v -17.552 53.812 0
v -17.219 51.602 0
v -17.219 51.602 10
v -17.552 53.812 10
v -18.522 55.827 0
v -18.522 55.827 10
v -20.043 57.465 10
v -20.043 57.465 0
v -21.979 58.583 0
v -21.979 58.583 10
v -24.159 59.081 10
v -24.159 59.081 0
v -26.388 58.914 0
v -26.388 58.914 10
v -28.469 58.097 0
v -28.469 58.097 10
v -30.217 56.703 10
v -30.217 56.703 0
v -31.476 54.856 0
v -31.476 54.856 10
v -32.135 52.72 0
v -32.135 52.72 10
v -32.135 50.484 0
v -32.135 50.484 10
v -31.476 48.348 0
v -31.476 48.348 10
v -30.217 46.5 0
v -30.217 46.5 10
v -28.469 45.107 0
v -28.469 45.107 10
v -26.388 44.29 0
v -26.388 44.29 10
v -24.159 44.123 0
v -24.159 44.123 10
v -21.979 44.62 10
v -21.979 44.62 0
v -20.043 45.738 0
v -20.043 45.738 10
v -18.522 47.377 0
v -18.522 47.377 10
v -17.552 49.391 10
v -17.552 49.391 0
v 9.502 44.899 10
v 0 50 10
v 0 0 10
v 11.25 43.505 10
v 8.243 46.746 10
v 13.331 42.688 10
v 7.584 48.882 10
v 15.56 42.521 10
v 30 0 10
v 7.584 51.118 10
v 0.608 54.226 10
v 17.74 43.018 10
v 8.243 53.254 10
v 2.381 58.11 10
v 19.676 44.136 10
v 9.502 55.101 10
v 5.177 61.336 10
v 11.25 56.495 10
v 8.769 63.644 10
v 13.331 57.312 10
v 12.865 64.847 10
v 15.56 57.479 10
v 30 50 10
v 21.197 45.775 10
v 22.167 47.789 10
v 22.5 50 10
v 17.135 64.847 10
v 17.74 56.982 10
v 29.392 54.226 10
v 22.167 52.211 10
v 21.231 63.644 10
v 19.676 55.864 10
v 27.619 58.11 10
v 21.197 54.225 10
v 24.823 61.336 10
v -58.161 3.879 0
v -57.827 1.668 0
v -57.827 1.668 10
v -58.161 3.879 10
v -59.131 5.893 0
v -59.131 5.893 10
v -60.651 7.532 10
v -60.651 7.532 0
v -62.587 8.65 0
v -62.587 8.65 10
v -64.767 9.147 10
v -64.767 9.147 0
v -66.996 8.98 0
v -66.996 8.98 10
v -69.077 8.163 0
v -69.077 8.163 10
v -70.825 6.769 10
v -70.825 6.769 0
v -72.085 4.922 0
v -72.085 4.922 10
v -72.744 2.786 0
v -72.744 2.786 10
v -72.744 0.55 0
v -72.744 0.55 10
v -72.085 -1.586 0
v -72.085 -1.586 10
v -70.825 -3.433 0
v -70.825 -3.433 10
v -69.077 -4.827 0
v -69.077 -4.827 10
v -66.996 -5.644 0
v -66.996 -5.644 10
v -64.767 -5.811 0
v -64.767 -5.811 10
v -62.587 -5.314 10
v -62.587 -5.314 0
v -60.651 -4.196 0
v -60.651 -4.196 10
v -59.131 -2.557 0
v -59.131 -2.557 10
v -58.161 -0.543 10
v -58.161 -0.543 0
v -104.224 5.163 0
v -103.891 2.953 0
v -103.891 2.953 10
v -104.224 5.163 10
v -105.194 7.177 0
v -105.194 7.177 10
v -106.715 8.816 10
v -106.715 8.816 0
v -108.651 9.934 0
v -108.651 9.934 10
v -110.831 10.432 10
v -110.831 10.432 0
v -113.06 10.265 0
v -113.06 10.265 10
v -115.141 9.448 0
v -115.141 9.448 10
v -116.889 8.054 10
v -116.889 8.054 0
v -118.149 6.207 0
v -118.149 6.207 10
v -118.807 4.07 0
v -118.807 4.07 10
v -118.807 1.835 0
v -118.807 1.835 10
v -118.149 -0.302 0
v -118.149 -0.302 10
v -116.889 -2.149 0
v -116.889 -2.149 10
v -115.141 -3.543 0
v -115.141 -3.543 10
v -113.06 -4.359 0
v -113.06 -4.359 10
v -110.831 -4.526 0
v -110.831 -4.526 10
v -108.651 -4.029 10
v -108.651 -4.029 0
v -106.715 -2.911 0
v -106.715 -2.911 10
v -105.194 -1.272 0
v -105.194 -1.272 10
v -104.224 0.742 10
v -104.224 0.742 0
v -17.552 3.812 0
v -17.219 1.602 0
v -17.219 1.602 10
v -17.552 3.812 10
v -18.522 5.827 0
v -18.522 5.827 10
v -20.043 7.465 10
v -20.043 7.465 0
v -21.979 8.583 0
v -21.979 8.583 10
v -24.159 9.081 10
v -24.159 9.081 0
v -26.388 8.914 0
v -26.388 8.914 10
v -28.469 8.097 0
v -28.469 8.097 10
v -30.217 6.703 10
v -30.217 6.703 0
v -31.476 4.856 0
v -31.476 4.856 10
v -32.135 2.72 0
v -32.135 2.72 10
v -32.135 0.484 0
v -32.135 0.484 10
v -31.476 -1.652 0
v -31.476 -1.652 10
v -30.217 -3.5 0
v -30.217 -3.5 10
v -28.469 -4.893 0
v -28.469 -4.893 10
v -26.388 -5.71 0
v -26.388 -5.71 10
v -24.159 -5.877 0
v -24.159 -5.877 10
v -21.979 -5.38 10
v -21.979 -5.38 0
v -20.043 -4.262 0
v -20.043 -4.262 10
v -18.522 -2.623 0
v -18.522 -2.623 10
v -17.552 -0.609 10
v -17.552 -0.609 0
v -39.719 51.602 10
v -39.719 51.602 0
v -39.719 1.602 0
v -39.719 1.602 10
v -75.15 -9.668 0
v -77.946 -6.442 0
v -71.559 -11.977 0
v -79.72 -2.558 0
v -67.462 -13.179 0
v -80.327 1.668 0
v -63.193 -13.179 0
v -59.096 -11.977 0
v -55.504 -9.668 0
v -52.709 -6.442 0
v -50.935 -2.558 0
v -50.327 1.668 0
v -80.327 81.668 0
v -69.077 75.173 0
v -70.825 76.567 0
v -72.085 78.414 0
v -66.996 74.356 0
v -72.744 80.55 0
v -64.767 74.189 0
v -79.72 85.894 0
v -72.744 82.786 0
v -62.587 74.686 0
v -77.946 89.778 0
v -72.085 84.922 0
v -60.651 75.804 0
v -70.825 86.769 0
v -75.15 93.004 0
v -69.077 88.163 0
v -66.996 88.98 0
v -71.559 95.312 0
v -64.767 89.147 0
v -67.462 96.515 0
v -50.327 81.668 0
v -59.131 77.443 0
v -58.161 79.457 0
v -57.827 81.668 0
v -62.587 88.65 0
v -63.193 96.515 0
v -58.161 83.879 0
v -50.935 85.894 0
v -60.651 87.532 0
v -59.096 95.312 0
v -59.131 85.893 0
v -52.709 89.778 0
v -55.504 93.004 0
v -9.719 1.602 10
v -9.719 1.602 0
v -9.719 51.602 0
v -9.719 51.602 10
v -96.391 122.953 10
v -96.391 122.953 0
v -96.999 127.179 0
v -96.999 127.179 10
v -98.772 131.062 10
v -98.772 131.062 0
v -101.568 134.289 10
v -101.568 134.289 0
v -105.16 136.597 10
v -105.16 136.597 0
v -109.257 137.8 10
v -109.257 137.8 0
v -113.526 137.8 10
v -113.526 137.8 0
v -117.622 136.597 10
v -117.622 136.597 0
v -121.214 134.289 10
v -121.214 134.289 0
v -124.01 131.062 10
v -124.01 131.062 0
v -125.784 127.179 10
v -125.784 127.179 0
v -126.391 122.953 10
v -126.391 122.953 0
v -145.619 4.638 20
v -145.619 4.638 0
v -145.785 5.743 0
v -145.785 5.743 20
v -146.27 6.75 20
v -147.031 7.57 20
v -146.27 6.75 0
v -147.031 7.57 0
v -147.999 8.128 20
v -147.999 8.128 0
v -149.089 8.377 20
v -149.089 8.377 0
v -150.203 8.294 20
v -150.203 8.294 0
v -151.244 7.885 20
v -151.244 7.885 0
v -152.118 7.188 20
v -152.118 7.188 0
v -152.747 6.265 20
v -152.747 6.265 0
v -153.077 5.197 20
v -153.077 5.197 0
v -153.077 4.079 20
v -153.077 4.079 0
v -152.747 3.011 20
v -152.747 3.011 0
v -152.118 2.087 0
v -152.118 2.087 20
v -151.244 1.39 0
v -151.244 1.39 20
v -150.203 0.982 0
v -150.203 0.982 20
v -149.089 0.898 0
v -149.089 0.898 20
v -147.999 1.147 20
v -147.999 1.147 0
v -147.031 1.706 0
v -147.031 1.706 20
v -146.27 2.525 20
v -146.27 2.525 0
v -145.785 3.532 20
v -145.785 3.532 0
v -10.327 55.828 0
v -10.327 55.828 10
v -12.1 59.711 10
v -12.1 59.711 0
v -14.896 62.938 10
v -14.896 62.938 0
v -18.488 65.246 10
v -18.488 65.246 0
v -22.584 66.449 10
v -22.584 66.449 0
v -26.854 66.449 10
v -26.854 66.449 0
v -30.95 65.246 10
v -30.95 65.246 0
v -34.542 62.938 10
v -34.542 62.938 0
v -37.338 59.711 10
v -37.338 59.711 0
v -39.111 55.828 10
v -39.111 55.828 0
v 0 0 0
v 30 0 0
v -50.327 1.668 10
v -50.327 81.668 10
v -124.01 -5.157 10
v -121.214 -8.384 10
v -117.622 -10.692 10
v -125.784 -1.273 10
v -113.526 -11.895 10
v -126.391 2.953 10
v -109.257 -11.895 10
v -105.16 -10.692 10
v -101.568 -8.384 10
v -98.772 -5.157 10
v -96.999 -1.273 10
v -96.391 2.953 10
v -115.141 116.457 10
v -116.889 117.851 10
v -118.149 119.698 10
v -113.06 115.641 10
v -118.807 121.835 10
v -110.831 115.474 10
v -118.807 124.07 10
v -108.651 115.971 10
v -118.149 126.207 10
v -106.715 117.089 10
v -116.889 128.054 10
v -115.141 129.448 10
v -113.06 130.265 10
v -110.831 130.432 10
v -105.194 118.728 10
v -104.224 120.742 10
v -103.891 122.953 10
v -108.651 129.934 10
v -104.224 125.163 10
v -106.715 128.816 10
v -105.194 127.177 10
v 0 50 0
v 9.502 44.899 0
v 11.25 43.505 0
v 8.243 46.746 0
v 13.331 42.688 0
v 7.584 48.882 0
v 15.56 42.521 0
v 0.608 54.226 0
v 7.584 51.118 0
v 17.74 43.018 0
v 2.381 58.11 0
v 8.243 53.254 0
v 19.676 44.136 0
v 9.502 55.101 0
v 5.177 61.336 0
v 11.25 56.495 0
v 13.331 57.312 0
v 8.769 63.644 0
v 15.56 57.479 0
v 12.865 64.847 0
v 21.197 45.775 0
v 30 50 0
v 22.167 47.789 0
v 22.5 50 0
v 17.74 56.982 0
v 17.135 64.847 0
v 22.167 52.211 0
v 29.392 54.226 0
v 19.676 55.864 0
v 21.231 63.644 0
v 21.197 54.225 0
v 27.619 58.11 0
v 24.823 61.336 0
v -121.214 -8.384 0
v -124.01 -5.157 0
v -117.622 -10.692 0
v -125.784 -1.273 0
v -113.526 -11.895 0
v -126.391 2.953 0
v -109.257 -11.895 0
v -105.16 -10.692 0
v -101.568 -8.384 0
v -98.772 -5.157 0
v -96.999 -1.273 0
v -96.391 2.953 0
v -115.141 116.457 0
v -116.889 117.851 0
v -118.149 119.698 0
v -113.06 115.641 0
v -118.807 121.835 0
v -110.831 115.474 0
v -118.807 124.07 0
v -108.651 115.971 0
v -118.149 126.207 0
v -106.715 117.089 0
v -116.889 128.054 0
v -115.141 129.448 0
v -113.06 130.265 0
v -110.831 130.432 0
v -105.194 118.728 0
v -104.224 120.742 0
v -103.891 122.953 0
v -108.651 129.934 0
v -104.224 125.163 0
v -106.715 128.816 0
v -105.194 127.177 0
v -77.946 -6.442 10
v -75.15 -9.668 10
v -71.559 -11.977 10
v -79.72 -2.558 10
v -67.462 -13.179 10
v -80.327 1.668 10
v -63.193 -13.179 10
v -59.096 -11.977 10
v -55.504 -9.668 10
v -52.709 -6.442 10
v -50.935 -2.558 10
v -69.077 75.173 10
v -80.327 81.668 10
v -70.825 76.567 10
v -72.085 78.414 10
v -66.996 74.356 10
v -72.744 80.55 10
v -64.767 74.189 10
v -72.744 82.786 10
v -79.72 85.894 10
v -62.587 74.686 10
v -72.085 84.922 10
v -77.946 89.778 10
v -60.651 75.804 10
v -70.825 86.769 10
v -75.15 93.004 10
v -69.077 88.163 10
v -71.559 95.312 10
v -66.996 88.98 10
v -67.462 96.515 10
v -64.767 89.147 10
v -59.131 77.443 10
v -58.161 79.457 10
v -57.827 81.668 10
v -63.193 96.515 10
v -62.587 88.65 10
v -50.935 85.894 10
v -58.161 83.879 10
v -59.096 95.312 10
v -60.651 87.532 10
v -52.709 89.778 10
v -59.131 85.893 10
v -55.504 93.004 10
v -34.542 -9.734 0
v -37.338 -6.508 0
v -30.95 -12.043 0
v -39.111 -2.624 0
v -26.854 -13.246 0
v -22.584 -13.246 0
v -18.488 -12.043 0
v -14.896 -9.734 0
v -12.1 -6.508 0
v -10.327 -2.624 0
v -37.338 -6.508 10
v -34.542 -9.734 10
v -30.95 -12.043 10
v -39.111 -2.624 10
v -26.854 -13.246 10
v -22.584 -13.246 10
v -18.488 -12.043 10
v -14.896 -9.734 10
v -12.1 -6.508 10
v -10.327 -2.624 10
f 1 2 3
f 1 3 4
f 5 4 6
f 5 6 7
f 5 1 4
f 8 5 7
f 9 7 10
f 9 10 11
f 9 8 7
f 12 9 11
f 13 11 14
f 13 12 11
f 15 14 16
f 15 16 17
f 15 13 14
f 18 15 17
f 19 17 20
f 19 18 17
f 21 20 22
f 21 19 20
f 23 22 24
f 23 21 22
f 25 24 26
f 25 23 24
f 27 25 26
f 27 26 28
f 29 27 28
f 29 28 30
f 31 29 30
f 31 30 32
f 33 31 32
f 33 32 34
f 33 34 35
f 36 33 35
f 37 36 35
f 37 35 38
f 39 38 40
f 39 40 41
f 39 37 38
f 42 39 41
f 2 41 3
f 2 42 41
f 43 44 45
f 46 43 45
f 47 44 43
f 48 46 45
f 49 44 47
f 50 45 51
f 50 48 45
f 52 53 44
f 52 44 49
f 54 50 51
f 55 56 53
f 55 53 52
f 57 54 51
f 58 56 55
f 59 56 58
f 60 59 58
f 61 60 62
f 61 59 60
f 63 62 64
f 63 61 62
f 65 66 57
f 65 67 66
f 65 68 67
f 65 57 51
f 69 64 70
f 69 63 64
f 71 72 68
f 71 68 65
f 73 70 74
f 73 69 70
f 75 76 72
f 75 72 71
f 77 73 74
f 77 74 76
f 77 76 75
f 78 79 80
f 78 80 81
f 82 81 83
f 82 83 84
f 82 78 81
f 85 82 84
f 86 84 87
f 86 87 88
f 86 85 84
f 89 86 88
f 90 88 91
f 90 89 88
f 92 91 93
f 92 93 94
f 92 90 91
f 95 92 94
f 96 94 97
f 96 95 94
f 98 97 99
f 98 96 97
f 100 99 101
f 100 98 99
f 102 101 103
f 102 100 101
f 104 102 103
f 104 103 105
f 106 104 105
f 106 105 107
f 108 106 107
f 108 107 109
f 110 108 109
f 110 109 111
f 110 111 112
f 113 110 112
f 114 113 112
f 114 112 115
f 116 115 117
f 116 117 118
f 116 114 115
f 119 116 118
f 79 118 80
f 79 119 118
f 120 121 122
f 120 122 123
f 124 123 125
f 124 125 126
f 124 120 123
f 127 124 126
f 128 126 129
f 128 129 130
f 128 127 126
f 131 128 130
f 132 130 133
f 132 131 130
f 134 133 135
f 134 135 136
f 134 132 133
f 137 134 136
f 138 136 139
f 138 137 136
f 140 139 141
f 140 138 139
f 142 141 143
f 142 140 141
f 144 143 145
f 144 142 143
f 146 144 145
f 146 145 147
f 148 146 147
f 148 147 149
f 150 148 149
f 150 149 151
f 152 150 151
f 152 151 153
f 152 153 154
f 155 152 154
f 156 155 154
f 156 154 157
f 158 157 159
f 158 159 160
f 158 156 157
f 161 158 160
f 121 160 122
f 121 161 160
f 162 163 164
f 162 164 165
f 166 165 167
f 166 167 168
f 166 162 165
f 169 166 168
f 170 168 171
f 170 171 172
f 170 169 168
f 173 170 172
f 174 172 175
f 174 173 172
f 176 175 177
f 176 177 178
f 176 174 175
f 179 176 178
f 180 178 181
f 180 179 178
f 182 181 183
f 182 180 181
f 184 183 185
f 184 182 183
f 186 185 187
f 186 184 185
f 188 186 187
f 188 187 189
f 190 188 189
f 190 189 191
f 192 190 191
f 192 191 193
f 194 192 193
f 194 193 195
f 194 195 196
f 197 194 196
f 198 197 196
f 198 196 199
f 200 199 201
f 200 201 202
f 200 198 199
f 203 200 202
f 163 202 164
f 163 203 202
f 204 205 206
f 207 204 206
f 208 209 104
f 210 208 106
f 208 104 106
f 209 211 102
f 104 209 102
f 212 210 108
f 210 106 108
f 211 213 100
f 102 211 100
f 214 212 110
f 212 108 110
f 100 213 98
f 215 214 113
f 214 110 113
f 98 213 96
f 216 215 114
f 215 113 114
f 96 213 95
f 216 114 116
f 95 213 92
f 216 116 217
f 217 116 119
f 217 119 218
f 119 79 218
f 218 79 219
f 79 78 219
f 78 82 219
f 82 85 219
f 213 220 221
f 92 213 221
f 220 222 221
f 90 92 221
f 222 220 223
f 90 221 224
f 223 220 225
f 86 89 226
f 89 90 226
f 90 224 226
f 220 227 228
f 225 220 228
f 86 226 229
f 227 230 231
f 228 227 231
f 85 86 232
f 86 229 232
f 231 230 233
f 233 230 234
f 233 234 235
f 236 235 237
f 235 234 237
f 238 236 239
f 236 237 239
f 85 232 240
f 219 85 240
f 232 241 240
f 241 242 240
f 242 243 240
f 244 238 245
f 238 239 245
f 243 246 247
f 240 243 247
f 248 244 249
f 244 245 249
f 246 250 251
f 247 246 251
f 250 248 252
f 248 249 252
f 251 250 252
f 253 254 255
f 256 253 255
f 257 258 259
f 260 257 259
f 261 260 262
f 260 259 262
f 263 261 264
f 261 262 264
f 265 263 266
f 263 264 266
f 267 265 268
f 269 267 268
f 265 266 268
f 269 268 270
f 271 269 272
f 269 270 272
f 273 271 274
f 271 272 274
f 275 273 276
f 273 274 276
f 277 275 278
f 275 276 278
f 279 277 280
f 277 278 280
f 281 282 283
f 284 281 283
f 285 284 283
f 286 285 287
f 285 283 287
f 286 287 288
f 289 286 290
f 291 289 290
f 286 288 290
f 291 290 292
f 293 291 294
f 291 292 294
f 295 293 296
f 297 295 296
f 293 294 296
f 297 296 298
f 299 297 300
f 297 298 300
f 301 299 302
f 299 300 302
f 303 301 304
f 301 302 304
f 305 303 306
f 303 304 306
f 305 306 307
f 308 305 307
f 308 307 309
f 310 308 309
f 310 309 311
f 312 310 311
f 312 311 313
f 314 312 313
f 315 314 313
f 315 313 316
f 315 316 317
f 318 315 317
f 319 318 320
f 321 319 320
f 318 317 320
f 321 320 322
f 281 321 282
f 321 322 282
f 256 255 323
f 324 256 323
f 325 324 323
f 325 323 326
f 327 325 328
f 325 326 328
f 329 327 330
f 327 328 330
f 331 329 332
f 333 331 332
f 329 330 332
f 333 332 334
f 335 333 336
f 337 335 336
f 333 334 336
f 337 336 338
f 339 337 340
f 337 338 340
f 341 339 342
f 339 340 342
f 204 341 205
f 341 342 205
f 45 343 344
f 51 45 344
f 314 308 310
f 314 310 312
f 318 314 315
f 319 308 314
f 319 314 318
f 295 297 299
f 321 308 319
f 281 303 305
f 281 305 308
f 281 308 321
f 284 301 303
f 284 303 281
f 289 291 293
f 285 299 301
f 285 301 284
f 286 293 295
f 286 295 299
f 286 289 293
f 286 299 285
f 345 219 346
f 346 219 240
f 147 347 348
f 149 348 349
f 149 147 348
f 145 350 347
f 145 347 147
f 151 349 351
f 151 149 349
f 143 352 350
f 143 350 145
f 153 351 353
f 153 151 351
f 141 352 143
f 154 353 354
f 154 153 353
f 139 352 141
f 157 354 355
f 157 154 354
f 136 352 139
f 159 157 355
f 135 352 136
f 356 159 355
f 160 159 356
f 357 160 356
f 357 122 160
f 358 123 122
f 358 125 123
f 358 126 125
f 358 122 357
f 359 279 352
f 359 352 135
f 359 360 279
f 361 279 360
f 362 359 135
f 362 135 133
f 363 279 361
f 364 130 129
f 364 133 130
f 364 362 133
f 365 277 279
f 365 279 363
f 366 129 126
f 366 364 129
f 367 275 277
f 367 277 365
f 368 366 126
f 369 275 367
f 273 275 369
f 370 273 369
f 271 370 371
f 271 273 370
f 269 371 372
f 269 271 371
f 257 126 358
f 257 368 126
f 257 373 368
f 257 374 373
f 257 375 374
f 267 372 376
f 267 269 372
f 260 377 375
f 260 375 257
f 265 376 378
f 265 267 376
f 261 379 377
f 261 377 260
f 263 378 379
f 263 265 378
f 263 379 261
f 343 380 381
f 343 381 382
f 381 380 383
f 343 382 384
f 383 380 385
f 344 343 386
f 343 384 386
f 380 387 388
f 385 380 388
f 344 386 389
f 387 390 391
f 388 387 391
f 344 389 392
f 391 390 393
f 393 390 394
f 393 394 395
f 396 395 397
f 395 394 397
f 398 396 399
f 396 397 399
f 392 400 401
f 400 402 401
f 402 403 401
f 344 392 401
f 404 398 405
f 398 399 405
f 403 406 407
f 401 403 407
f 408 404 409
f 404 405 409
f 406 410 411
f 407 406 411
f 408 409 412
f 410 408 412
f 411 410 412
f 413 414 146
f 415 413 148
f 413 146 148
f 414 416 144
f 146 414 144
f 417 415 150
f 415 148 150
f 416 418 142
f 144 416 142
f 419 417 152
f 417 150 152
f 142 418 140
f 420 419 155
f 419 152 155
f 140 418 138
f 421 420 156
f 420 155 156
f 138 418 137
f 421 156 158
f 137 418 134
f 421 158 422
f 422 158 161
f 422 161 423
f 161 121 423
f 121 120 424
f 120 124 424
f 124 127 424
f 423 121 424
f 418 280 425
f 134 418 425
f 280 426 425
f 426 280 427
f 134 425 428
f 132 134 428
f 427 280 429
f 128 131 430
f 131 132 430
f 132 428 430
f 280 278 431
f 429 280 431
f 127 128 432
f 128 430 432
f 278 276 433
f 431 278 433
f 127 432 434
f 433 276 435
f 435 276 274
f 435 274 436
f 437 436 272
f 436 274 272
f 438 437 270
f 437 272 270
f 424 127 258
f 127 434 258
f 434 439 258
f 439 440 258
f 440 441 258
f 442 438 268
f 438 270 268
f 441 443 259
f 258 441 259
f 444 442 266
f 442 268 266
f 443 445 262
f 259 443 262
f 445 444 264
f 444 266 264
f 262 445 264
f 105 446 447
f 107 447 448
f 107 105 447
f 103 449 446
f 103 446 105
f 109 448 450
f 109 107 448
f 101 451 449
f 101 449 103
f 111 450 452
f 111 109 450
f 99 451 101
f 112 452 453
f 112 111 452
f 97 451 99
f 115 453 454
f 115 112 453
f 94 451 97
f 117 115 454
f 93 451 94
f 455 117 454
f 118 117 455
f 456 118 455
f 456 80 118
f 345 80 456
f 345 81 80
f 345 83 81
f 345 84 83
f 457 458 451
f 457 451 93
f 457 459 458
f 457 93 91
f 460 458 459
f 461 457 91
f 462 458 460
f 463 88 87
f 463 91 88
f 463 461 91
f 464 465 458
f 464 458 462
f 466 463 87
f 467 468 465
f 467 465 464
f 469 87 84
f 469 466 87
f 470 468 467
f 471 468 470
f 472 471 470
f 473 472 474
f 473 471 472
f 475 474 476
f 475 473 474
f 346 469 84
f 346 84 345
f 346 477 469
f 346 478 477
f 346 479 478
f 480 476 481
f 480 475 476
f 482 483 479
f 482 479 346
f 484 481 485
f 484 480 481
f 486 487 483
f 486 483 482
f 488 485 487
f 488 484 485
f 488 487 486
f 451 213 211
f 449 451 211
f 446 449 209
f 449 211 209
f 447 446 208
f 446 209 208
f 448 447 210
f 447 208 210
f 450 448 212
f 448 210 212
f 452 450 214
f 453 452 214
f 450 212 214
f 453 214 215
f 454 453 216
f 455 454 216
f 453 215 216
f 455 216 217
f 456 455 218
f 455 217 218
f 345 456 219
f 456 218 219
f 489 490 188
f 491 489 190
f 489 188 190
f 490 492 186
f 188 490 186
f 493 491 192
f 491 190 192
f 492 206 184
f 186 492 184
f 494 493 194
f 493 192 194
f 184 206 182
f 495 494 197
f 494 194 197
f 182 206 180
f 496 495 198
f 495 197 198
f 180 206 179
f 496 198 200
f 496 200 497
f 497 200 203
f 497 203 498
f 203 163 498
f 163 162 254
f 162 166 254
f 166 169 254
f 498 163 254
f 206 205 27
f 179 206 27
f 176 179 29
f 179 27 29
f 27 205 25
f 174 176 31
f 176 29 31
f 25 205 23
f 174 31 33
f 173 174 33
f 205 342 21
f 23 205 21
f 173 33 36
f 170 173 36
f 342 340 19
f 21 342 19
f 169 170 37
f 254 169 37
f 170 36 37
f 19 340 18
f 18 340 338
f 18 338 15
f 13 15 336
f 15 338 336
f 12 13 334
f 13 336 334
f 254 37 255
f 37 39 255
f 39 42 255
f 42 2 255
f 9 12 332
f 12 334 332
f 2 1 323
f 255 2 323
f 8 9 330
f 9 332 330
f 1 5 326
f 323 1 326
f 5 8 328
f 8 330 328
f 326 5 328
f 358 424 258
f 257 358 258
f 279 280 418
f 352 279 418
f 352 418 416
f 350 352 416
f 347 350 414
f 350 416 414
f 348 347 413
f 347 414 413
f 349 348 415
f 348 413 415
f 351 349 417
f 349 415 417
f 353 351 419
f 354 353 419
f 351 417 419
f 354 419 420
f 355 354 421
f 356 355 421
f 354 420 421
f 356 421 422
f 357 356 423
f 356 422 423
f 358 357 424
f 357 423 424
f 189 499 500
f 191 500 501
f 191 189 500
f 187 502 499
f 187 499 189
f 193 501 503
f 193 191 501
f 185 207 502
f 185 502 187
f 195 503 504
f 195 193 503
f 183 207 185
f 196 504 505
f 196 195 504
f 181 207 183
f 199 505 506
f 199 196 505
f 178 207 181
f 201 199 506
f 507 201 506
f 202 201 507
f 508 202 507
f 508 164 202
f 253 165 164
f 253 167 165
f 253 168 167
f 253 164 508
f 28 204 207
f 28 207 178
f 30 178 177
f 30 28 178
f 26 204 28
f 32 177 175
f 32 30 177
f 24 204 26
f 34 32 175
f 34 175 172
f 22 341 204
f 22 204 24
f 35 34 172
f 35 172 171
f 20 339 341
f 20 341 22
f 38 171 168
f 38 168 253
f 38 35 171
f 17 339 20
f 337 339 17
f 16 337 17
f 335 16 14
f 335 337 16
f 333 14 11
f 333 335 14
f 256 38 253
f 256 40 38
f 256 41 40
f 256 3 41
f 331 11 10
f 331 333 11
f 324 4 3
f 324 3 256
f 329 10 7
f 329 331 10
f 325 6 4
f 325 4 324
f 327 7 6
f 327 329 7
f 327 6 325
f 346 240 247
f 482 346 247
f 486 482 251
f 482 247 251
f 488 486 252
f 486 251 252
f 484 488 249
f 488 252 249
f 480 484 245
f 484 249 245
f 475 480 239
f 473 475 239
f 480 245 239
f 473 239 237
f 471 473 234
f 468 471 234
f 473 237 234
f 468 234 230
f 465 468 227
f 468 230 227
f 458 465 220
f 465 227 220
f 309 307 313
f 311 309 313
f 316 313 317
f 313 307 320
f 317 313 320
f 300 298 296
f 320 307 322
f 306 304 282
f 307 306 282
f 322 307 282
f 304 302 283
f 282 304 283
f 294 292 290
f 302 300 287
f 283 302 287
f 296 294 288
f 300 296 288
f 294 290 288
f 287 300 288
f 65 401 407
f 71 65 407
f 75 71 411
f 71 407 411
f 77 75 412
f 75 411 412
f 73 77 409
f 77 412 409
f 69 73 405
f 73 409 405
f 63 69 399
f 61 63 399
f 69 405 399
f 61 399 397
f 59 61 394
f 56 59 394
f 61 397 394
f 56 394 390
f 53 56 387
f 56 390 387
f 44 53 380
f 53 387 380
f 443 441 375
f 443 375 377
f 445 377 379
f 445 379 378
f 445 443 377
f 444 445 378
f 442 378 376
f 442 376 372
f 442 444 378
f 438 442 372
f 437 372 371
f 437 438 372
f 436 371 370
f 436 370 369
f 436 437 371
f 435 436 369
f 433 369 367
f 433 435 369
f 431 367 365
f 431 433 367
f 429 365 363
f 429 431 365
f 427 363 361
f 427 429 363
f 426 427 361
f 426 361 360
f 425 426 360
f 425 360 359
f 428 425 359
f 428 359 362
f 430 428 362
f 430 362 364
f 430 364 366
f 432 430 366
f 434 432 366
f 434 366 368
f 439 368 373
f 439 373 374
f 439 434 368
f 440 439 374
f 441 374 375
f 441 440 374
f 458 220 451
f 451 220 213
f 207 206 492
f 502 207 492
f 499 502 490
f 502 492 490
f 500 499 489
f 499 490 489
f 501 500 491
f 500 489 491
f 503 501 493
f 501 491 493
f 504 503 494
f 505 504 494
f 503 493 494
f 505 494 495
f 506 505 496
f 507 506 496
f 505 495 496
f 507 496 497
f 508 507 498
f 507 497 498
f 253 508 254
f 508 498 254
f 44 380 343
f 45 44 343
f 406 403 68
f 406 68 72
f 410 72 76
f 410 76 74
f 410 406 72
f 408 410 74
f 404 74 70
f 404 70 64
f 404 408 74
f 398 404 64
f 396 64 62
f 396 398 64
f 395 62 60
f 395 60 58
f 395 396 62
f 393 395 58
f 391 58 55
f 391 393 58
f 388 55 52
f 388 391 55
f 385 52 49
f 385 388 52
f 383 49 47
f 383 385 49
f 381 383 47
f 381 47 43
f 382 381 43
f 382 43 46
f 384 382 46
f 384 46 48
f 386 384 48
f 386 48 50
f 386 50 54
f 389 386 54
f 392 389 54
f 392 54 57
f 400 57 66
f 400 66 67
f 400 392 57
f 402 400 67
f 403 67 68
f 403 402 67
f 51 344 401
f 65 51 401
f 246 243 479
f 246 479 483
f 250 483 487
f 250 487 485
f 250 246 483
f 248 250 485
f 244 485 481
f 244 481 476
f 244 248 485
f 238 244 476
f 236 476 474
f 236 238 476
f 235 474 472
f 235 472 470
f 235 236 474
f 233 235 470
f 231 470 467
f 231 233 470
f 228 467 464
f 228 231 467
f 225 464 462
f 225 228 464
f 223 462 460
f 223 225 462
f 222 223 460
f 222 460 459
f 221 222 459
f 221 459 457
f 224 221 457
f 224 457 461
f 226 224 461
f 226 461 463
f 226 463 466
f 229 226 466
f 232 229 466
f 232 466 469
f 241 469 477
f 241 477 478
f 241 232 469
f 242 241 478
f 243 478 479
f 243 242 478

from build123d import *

# Parameters (mm, degrees)
F1_R      = 7.5
F2_DEPTH  = 10
F3_R      = 7.5
F4_DEPTH  = 10
F5_R      = 7.5
F6_DEPTH  = 10
F7_R      = 7.5
F8_DEPTH  = 10
F9_R      = 3.75
F10_DEPTH = 20


with BuildPart() as f2:
    # F1 (on Top) → F2 (new body)
    with BuildSketch(Plane.XY):
        with BuildLine():
            Line((0, 50), (0, 0))
            Line((0, 0), (30, 0))
            Line((30, 0), (30, 50))
            ThreePointArc((30, 50), (15, 65), (0, 50))
        make_face()
        with Locations((15, 50)):
            Circle(F1_R, mode=Mode.SUBTRACT)
    extrude(amount=F2_DEPTH)


with BuildPart() as f4:
    # F3 (on Top) → F4 (new body)
    with BuildSketch(Plane.XY):
        with BuildLine():
            Line((-39.7190231457, 51.6017495219), (-39.7190231457, 1.6017495219))
            ThreePointArc((-39.7190231457, 1.6017495219), (-24.7190231457, -13.3982504781), (-9.7190231457, 1.6017495219))
            Line((-9.7190231457, 1.6017495219), (-9.7190231457, 51.6017495219))
            ThreePointArc((-9.7190231457, 51.6017495219), (-24.7190231457, 66.6017495219), (-39.7190231457, 51.6017495219))
        make_face()
        with Locations((-24.7190231457, 1.6017495219)):
            Circle(F3_R, mode=Mode.SUBTRACT)
        with Locations((-24.7190231457, 51.6017495219)):
            Circle(F3_R, mode=Mode.SUBTRACT)
    extrude(amount=F4_DEPTH)


with BuildPart() as f6:
    # F5 (on Top) → F6 (new body)
    with BuildSketch(Plane.XY):
        with BuildLine():
            Line((-80.3273612261, 81.6679674387), (-80.3273612261, 1.6679674387))
            ThreePointArc((-80.3273612261, 1.6679674387), (-65.3273612261, -13.3320325613), (-50.3273612261, 1.6679674387))
            Line((-50.3273612261, 1.6679674387), (-50.3273612261, 81.6679674387))
            ThreePointArc((-50.3273612261, 81.6679674387), (-65.3273612261, 96.6679674387), (-80.3273612261, 81.6679674387))
        make_face()
        with Locations((-65.3273612261, 1.6679674387)):
            Circle(F5_R, mode=Mode.SUBTRACT)
        with Locations((-65.3273612261, 81.6679674387)):
            Circle(F5_R, mode=Mode.SUBTRACT)
    extrude(amount=F6_DEPTH)


with BuildPart() as f8:
    # F7 (on Top) → F8 (new body)
    with BuildSketch(Plane.XY):
        with BuildLine():
            Line((-126.3912388682, 122.9525510035), (-126.3912388682, 2.9525510035))
            ThreePointArc((-126.3912388682, 2.9525510035), (-111.3912388682, -12.0474489965), (-96.3912388682, 2.9525510035))
            Line((-96.3912388682, 2.9525510035), (-96.3912388682, 122.9525510035))
            ThreePointArc((-96.3912388682, 122.9525510035), (-111.3912388682, 137.9525510035), (-126.3912388682, 122.9525510035))
        make_face()
        with Locations((-111.3912388682, 2.9525510035)):
            Circle(F7_R, mode=Mode.SUBTRACT)
        with Locations((-111.3912388682, 122.9525510035)):
            Circle(F7_R, mode=Mode.SUBTRACT)
    extrude(amount=F8_DEPTH)


with BuildPart() as f10:
    # F9 (on Top) → F10 (new body)
    with BuildSketch(Plane.XY):
        with Locations((-149.3688076735, 4.637687467)):
            Circle(F9_R)
    extrude(amount=F10_DEPTH)


solid = Compound([f2.part, f4.part, f6.part, f8.part, f10.part])
